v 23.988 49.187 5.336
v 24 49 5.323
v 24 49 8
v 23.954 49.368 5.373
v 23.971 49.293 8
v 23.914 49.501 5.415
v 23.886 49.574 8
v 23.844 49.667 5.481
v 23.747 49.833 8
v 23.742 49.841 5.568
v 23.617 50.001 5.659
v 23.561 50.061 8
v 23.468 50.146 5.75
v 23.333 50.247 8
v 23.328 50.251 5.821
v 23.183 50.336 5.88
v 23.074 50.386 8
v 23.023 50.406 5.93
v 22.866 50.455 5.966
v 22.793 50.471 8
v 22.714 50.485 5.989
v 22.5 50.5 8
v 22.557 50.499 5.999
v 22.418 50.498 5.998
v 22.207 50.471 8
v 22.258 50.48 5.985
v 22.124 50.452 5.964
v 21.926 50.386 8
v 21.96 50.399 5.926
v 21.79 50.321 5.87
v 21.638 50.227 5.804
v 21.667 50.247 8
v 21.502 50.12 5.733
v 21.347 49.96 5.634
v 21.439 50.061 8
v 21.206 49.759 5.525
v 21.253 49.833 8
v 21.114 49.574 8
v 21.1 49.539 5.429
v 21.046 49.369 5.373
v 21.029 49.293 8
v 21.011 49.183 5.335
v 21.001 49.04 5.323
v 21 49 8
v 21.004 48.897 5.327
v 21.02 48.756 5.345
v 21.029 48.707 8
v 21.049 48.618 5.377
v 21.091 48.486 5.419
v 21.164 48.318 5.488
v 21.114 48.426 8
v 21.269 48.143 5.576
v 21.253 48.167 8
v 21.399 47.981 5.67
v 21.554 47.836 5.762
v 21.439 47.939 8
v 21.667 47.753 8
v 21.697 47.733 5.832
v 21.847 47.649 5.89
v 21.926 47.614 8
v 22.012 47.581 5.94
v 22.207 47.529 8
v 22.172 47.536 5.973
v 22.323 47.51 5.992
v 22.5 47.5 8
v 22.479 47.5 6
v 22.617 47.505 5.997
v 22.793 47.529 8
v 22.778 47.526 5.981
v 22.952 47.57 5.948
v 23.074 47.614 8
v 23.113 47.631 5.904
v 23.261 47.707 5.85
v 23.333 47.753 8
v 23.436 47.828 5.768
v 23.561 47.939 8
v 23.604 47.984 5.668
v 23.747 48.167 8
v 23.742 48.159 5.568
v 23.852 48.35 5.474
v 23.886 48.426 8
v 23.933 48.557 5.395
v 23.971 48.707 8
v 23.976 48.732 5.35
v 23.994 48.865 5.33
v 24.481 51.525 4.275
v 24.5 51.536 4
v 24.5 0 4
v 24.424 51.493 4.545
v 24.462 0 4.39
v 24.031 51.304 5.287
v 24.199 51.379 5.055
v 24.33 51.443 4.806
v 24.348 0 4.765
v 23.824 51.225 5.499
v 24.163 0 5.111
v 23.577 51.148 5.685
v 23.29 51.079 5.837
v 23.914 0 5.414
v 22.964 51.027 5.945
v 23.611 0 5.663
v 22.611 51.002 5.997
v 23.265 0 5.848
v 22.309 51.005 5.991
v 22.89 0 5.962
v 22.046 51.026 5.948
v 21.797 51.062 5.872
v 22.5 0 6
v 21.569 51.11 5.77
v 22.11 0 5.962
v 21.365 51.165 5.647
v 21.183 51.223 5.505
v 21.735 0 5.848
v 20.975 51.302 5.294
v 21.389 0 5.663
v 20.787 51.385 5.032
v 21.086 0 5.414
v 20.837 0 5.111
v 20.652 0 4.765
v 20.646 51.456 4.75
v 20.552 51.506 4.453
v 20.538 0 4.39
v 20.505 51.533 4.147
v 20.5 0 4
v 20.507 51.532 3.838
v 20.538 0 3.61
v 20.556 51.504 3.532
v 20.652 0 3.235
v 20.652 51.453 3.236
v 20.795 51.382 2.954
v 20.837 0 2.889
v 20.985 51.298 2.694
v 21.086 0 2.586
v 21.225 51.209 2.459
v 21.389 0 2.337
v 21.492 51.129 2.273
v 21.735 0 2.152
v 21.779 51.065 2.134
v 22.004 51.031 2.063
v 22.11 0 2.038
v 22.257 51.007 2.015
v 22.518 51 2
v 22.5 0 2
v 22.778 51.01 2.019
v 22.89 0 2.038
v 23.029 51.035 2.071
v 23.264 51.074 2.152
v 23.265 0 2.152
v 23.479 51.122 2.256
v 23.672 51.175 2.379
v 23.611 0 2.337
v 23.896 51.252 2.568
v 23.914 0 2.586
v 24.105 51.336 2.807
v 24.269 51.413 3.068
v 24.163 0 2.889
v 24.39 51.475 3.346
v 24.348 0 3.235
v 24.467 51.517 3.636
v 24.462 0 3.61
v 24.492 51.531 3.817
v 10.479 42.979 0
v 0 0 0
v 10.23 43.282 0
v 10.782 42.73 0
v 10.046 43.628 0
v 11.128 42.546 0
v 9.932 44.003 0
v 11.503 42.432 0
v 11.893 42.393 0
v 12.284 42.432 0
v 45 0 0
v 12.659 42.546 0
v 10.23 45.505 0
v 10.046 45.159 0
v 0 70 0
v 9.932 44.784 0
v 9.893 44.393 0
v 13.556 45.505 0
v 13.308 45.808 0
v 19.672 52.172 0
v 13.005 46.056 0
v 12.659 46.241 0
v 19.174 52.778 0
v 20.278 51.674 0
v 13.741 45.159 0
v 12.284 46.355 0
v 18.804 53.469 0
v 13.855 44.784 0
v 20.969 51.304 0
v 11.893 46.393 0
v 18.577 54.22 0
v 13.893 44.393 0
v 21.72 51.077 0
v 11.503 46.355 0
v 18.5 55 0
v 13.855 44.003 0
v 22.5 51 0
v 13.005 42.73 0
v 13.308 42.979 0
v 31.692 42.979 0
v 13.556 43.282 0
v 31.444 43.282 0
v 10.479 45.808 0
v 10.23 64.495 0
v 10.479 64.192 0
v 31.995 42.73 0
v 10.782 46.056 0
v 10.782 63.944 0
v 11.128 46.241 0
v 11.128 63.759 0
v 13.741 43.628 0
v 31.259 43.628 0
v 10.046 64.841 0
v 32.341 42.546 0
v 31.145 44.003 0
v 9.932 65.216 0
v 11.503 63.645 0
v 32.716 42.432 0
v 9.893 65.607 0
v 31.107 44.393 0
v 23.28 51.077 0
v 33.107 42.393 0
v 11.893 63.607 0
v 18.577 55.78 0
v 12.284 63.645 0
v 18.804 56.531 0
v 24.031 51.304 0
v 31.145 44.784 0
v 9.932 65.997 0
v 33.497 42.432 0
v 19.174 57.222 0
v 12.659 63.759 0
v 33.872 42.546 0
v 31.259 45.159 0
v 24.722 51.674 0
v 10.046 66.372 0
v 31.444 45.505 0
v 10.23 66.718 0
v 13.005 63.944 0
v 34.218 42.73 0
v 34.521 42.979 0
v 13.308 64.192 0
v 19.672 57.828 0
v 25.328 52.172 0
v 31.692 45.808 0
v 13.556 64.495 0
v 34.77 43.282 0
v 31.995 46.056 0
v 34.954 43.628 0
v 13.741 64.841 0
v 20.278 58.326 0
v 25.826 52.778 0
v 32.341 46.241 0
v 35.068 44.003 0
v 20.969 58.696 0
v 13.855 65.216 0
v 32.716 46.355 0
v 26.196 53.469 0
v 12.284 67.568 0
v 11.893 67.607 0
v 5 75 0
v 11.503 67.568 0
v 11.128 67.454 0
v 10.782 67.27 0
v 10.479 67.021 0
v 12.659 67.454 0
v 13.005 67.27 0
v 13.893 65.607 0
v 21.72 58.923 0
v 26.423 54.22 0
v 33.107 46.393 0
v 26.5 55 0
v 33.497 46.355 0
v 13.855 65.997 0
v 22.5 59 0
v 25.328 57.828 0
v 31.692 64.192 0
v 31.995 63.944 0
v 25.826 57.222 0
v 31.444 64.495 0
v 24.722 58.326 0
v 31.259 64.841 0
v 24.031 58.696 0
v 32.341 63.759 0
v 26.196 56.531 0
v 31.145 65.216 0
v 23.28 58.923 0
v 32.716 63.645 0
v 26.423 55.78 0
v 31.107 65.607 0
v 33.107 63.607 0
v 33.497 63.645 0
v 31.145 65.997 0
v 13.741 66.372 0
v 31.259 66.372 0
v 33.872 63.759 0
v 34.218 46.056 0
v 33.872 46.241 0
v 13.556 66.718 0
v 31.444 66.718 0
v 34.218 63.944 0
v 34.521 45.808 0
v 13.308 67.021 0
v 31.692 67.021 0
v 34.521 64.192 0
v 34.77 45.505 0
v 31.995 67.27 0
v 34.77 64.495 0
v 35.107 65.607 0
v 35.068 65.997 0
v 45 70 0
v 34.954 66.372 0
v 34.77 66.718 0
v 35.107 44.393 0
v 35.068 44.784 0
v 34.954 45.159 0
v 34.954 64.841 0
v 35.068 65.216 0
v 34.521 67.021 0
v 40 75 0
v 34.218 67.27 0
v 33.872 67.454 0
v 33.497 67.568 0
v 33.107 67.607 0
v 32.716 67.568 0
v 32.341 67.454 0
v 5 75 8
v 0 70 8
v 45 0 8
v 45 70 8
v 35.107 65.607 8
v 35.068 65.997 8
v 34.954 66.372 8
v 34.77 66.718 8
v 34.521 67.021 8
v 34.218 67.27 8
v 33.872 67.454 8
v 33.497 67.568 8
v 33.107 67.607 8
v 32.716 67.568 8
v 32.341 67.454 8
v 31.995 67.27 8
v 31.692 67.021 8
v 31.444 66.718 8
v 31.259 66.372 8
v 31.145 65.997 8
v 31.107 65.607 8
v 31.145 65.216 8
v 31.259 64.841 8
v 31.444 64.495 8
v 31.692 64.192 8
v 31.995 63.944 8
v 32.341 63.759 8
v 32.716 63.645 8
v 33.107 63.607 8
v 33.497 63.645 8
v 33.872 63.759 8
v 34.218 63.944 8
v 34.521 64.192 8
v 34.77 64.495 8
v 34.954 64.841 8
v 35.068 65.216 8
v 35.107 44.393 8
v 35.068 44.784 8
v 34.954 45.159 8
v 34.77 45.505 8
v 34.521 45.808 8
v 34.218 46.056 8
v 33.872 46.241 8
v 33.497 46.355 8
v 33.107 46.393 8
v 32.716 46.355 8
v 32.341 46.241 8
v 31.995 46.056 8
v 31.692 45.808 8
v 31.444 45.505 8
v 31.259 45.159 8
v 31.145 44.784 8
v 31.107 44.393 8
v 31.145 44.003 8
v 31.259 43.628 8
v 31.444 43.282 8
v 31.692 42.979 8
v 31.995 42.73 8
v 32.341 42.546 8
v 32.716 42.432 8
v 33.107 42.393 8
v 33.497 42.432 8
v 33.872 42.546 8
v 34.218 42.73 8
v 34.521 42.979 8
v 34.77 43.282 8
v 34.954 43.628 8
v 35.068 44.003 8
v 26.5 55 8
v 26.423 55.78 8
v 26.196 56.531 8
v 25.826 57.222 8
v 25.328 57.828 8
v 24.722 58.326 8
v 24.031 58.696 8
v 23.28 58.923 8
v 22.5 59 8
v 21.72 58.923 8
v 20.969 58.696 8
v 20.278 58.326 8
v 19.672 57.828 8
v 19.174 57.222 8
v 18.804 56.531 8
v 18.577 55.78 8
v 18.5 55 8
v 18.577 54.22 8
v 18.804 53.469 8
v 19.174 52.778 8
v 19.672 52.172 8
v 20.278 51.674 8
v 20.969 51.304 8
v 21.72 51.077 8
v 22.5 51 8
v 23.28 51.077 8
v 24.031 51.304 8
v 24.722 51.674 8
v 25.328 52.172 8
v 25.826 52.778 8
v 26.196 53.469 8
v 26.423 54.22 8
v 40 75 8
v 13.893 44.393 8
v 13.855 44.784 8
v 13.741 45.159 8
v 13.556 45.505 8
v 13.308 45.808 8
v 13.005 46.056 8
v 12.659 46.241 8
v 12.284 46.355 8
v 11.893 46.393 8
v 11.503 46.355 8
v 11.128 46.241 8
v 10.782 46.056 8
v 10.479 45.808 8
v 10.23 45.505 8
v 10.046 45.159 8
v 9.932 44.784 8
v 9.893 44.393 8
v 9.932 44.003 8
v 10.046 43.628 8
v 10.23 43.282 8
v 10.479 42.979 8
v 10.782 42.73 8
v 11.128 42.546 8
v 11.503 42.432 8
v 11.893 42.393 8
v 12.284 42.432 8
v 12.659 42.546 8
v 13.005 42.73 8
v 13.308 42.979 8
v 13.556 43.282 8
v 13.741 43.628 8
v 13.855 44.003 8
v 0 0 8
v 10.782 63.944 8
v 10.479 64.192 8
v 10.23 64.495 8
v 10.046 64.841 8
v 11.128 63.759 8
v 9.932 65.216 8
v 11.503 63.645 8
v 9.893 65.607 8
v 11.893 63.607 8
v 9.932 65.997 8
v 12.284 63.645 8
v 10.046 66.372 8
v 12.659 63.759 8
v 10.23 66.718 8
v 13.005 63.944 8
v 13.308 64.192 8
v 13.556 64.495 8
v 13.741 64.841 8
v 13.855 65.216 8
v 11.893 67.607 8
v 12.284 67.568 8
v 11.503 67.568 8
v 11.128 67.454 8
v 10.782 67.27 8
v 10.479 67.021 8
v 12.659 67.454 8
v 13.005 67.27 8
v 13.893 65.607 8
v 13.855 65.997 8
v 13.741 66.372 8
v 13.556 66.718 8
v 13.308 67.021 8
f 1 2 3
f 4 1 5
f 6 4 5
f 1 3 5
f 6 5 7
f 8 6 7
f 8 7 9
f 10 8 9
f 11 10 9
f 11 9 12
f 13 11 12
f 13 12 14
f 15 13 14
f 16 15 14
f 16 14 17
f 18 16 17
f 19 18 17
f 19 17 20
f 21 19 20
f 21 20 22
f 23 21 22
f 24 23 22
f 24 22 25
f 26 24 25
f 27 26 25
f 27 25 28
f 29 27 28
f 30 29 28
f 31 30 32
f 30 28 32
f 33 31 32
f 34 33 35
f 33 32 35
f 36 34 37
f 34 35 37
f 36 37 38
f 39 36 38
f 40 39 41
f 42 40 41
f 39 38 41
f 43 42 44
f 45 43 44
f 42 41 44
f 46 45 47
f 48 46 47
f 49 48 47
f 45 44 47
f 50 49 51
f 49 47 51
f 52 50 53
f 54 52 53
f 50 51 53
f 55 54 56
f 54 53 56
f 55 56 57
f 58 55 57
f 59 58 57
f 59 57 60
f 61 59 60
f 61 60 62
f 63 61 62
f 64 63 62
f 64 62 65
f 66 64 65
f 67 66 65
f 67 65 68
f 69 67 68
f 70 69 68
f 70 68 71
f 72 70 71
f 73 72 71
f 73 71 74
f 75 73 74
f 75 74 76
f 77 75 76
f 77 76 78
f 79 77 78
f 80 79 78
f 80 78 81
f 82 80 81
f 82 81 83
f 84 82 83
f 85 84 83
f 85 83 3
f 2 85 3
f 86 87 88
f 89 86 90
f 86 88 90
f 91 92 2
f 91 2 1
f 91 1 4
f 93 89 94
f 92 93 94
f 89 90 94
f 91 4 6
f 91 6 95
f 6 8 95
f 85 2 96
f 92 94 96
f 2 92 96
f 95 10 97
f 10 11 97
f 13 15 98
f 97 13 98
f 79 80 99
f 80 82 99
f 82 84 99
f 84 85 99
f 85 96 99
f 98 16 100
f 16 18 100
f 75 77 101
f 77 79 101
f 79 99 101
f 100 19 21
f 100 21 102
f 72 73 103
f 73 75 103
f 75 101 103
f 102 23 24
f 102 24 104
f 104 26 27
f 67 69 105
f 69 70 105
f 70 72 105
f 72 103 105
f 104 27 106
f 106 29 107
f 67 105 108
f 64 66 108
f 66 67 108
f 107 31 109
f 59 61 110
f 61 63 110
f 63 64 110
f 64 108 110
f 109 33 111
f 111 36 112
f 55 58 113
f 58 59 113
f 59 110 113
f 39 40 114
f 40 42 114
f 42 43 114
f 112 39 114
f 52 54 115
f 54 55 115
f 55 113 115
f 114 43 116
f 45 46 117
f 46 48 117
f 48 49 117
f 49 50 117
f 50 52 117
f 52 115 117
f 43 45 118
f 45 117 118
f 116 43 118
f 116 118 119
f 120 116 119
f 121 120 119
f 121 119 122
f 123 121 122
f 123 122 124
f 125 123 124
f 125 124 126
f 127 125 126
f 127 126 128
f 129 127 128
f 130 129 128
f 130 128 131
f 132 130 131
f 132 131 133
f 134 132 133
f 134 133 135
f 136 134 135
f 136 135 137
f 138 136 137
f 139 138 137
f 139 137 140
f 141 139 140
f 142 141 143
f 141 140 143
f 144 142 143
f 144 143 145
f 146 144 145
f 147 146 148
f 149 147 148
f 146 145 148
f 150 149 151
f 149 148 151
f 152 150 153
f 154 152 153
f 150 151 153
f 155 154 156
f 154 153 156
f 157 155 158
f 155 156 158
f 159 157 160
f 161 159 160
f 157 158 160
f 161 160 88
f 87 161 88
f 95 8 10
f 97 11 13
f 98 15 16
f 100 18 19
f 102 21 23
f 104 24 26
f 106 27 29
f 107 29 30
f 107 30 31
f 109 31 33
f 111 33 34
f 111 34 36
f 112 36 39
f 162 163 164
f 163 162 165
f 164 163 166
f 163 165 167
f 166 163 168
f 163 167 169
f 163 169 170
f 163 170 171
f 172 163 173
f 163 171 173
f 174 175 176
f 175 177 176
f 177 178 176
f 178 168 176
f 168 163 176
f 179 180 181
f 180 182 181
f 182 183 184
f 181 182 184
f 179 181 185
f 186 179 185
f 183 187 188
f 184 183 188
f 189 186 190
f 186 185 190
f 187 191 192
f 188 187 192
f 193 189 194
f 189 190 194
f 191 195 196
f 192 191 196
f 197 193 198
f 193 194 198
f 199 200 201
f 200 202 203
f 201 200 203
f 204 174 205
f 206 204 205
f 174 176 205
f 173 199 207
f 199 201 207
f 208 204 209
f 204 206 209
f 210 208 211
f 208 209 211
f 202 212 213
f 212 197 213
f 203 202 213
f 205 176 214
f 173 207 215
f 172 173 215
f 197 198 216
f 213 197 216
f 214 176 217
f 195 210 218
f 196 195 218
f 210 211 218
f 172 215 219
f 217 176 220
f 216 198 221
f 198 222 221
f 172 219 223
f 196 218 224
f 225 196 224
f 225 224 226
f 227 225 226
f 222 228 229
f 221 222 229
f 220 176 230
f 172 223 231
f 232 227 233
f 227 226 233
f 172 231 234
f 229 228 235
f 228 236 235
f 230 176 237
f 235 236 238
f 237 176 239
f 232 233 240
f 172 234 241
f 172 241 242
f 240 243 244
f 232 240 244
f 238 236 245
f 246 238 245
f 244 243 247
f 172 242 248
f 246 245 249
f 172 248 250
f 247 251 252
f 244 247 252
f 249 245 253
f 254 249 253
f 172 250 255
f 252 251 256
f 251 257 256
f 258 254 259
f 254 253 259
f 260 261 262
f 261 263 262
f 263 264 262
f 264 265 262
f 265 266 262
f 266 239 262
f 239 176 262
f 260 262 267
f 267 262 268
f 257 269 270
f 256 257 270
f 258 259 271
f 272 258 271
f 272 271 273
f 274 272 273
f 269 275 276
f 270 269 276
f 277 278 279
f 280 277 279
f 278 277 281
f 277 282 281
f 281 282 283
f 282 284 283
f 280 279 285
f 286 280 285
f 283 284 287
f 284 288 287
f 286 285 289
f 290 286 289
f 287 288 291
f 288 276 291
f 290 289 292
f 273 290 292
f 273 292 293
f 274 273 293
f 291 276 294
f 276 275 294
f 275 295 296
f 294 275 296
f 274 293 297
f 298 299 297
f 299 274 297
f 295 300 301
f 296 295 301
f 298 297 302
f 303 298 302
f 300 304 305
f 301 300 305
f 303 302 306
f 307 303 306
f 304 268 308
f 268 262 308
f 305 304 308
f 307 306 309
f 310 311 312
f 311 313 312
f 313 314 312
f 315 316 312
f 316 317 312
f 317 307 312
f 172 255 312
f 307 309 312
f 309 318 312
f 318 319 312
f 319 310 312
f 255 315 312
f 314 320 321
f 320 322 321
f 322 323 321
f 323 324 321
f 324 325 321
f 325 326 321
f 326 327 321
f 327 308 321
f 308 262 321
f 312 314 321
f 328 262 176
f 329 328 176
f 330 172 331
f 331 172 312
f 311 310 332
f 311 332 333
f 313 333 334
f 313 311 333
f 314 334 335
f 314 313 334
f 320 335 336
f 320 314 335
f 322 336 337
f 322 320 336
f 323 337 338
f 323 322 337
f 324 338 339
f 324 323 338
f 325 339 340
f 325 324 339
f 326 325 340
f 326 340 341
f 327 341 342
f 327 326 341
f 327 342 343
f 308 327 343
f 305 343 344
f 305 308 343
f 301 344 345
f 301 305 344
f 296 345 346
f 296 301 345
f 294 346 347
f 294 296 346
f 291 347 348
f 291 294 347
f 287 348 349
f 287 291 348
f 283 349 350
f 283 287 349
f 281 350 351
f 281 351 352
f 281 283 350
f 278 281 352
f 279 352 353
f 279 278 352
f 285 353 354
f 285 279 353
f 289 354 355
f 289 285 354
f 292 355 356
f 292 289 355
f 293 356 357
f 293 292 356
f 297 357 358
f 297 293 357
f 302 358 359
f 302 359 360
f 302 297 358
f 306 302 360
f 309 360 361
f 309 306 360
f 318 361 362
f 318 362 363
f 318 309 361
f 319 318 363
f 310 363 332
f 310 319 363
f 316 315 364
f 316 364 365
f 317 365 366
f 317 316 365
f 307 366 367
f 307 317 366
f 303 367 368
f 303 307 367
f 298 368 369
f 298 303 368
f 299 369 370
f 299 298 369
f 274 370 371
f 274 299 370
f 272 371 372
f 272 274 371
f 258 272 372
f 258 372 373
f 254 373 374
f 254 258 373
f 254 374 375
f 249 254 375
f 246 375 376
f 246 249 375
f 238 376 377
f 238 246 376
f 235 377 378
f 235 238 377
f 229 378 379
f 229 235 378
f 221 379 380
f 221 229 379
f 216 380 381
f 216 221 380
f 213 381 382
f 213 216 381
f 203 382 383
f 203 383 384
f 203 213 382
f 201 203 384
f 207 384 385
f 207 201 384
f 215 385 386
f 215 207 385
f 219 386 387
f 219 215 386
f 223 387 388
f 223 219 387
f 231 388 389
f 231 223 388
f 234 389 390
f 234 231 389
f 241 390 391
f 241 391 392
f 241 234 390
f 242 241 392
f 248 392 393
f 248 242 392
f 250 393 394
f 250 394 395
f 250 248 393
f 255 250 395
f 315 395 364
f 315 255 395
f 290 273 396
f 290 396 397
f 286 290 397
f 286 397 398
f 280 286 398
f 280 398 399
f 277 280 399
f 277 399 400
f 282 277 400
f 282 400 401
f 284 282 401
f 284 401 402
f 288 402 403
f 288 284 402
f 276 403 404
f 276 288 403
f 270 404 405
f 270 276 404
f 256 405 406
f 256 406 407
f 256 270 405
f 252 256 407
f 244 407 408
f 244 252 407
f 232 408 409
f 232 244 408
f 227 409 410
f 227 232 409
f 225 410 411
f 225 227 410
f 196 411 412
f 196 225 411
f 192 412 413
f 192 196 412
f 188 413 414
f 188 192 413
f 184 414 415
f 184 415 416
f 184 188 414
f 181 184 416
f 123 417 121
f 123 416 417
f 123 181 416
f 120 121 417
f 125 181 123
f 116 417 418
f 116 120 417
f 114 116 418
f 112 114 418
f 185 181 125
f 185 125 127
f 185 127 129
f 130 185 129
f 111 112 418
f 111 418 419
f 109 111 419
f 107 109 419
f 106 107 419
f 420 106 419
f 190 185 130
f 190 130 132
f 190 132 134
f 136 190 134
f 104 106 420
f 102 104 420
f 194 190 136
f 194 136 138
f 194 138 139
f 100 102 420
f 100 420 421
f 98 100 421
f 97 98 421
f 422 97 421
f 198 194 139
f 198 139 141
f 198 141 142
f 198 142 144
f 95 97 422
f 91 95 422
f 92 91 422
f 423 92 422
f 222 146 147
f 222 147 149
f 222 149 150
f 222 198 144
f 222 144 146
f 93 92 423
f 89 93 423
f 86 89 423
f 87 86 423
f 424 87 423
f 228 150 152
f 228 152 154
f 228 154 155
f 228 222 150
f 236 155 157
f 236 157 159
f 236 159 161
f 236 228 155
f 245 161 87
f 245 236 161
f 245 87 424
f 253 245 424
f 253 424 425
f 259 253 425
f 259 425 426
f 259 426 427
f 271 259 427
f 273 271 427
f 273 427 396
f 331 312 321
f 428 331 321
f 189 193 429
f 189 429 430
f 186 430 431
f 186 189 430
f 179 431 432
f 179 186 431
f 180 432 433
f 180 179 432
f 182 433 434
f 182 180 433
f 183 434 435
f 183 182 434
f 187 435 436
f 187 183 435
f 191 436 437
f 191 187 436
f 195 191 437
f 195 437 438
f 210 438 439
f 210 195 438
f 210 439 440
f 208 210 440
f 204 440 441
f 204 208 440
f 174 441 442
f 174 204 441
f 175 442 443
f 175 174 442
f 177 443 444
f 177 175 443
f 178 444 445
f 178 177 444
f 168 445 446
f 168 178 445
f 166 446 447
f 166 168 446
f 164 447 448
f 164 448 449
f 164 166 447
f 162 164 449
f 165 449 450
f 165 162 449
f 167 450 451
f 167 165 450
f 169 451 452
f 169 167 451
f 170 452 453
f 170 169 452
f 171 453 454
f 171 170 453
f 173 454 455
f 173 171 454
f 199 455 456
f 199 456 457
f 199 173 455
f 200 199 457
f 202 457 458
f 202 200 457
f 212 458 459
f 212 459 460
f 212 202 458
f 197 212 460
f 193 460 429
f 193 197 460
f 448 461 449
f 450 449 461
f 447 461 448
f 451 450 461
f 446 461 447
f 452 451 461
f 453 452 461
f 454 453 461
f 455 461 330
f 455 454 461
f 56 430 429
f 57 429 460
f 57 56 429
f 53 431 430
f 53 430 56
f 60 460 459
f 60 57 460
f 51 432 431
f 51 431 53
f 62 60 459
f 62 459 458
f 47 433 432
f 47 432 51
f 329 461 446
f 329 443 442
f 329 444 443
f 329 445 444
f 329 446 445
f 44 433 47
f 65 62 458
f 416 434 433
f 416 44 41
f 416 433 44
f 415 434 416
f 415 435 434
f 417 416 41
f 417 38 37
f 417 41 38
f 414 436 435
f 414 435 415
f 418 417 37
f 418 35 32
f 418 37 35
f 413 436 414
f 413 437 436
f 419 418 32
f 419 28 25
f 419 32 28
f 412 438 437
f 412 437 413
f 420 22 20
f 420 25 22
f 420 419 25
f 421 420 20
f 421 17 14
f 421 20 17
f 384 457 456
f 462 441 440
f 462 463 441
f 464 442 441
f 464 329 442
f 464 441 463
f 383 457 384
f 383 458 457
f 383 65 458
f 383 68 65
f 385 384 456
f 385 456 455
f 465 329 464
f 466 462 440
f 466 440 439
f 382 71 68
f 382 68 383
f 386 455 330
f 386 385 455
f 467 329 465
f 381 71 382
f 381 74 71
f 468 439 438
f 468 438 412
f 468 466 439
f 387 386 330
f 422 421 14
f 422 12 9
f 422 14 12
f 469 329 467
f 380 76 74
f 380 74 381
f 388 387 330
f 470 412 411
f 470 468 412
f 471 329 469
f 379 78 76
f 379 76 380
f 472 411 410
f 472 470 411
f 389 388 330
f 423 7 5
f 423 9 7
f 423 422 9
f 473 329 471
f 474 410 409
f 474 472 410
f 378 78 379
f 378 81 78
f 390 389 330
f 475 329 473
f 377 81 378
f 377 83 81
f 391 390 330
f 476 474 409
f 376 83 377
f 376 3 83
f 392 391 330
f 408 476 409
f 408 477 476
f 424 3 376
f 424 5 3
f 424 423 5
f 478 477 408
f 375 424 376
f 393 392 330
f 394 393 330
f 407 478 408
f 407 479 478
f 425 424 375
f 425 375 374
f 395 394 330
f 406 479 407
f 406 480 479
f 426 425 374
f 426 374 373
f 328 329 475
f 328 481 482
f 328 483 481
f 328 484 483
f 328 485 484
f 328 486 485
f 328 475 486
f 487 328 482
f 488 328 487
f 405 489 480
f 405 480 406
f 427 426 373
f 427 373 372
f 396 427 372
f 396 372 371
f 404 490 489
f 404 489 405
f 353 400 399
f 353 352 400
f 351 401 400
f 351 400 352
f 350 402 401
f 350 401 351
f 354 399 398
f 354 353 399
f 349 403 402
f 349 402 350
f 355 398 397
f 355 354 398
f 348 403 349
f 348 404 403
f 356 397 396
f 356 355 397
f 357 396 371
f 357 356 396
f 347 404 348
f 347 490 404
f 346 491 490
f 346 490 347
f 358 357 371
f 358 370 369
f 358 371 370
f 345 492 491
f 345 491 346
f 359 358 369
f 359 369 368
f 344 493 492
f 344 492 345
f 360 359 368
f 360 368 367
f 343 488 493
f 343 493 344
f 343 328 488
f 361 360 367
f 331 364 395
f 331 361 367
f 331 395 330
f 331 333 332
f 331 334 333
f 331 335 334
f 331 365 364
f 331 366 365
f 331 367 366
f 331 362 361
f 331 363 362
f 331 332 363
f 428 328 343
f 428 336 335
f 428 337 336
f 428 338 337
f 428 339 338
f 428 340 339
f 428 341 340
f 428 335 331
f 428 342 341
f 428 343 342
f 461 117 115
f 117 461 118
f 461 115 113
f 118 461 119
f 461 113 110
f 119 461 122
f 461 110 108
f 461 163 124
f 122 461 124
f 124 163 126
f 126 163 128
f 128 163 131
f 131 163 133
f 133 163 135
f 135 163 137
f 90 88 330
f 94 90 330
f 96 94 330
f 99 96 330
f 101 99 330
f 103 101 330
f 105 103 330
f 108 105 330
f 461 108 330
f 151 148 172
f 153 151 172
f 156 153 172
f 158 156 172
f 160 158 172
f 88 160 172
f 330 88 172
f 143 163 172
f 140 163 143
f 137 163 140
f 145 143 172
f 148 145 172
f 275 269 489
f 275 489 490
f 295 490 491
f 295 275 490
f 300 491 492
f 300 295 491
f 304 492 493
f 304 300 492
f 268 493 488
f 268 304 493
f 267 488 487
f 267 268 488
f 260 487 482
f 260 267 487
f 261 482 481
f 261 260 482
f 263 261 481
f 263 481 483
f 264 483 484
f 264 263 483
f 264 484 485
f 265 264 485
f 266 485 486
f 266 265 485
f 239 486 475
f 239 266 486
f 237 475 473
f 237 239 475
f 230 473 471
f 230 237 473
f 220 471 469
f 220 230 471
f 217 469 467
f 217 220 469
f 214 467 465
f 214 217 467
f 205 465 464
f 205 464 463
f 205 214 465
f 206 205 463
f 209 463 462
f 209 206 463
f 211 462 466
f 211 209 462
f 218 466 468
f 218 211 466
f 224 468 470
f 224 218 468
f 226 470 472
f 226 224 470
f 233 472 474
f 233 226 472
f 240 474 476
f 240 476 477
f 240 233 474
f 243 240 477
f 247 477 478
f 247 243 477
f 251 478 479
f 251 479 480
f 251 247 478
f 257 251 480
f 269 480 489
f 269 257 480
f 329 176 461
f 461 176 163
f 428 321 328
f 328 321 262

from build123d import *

# Parameters (mm, degrees)
F0_R     = 2
F0_R_2   = 4
F1_DEPTH = 8
F2_R     = 2
F3_DEPTH = 53
F4_R     = 1.5
F5_DEPTH = 3


with BuildPart() as f1:
    # F0 (on Top) → F1 (new body)
    with BuildSketch(Plane.XY):
        Polygon((0, 70), (0, 0), (45, 0), (45, 70), (40, 75), (5, 75), align=None)
        with Locations((11.893398, 44.393398)):
            Circle(F0_R, mode=Mode.SUBTRACT)
        with Locations((11.893398, 65.606602)):
            Circle(F0_R, mode=Mode.SUBTRACT)
        with Locations((33.106602, 44.393398)):
            Circle(F0_R, mode=Mode.SUBTRACT)
        with Locations((22.5, 55)):
            Circle(F0_R_2, mode=Mode.SUBTRACT)
        with Locations((33.106602, 65.606602)):
            Circle(F0_R, mode=Mode.SUBTRACT)
    extrude(amount=F1_DEPTH)

    # F2 (on face) → F3 (cut)
    with BuildSketch(Plane.XZ):
        with Locations((22.5, 4)):
            Circle(F2_R)
    extrude(amount=-F3_DEPTH, mode=Mode.SUBTRACT)

    # F4 (on face) → F5 (cut)
    with BuildSketch(Plane.XY.offset(8)):
        with Locations((22.5, 49)):
            Circle(F4_R)
    extrude(amount=-F5_DEPTH, mode=Mode.SUBTRACT)


solid = f1.part
